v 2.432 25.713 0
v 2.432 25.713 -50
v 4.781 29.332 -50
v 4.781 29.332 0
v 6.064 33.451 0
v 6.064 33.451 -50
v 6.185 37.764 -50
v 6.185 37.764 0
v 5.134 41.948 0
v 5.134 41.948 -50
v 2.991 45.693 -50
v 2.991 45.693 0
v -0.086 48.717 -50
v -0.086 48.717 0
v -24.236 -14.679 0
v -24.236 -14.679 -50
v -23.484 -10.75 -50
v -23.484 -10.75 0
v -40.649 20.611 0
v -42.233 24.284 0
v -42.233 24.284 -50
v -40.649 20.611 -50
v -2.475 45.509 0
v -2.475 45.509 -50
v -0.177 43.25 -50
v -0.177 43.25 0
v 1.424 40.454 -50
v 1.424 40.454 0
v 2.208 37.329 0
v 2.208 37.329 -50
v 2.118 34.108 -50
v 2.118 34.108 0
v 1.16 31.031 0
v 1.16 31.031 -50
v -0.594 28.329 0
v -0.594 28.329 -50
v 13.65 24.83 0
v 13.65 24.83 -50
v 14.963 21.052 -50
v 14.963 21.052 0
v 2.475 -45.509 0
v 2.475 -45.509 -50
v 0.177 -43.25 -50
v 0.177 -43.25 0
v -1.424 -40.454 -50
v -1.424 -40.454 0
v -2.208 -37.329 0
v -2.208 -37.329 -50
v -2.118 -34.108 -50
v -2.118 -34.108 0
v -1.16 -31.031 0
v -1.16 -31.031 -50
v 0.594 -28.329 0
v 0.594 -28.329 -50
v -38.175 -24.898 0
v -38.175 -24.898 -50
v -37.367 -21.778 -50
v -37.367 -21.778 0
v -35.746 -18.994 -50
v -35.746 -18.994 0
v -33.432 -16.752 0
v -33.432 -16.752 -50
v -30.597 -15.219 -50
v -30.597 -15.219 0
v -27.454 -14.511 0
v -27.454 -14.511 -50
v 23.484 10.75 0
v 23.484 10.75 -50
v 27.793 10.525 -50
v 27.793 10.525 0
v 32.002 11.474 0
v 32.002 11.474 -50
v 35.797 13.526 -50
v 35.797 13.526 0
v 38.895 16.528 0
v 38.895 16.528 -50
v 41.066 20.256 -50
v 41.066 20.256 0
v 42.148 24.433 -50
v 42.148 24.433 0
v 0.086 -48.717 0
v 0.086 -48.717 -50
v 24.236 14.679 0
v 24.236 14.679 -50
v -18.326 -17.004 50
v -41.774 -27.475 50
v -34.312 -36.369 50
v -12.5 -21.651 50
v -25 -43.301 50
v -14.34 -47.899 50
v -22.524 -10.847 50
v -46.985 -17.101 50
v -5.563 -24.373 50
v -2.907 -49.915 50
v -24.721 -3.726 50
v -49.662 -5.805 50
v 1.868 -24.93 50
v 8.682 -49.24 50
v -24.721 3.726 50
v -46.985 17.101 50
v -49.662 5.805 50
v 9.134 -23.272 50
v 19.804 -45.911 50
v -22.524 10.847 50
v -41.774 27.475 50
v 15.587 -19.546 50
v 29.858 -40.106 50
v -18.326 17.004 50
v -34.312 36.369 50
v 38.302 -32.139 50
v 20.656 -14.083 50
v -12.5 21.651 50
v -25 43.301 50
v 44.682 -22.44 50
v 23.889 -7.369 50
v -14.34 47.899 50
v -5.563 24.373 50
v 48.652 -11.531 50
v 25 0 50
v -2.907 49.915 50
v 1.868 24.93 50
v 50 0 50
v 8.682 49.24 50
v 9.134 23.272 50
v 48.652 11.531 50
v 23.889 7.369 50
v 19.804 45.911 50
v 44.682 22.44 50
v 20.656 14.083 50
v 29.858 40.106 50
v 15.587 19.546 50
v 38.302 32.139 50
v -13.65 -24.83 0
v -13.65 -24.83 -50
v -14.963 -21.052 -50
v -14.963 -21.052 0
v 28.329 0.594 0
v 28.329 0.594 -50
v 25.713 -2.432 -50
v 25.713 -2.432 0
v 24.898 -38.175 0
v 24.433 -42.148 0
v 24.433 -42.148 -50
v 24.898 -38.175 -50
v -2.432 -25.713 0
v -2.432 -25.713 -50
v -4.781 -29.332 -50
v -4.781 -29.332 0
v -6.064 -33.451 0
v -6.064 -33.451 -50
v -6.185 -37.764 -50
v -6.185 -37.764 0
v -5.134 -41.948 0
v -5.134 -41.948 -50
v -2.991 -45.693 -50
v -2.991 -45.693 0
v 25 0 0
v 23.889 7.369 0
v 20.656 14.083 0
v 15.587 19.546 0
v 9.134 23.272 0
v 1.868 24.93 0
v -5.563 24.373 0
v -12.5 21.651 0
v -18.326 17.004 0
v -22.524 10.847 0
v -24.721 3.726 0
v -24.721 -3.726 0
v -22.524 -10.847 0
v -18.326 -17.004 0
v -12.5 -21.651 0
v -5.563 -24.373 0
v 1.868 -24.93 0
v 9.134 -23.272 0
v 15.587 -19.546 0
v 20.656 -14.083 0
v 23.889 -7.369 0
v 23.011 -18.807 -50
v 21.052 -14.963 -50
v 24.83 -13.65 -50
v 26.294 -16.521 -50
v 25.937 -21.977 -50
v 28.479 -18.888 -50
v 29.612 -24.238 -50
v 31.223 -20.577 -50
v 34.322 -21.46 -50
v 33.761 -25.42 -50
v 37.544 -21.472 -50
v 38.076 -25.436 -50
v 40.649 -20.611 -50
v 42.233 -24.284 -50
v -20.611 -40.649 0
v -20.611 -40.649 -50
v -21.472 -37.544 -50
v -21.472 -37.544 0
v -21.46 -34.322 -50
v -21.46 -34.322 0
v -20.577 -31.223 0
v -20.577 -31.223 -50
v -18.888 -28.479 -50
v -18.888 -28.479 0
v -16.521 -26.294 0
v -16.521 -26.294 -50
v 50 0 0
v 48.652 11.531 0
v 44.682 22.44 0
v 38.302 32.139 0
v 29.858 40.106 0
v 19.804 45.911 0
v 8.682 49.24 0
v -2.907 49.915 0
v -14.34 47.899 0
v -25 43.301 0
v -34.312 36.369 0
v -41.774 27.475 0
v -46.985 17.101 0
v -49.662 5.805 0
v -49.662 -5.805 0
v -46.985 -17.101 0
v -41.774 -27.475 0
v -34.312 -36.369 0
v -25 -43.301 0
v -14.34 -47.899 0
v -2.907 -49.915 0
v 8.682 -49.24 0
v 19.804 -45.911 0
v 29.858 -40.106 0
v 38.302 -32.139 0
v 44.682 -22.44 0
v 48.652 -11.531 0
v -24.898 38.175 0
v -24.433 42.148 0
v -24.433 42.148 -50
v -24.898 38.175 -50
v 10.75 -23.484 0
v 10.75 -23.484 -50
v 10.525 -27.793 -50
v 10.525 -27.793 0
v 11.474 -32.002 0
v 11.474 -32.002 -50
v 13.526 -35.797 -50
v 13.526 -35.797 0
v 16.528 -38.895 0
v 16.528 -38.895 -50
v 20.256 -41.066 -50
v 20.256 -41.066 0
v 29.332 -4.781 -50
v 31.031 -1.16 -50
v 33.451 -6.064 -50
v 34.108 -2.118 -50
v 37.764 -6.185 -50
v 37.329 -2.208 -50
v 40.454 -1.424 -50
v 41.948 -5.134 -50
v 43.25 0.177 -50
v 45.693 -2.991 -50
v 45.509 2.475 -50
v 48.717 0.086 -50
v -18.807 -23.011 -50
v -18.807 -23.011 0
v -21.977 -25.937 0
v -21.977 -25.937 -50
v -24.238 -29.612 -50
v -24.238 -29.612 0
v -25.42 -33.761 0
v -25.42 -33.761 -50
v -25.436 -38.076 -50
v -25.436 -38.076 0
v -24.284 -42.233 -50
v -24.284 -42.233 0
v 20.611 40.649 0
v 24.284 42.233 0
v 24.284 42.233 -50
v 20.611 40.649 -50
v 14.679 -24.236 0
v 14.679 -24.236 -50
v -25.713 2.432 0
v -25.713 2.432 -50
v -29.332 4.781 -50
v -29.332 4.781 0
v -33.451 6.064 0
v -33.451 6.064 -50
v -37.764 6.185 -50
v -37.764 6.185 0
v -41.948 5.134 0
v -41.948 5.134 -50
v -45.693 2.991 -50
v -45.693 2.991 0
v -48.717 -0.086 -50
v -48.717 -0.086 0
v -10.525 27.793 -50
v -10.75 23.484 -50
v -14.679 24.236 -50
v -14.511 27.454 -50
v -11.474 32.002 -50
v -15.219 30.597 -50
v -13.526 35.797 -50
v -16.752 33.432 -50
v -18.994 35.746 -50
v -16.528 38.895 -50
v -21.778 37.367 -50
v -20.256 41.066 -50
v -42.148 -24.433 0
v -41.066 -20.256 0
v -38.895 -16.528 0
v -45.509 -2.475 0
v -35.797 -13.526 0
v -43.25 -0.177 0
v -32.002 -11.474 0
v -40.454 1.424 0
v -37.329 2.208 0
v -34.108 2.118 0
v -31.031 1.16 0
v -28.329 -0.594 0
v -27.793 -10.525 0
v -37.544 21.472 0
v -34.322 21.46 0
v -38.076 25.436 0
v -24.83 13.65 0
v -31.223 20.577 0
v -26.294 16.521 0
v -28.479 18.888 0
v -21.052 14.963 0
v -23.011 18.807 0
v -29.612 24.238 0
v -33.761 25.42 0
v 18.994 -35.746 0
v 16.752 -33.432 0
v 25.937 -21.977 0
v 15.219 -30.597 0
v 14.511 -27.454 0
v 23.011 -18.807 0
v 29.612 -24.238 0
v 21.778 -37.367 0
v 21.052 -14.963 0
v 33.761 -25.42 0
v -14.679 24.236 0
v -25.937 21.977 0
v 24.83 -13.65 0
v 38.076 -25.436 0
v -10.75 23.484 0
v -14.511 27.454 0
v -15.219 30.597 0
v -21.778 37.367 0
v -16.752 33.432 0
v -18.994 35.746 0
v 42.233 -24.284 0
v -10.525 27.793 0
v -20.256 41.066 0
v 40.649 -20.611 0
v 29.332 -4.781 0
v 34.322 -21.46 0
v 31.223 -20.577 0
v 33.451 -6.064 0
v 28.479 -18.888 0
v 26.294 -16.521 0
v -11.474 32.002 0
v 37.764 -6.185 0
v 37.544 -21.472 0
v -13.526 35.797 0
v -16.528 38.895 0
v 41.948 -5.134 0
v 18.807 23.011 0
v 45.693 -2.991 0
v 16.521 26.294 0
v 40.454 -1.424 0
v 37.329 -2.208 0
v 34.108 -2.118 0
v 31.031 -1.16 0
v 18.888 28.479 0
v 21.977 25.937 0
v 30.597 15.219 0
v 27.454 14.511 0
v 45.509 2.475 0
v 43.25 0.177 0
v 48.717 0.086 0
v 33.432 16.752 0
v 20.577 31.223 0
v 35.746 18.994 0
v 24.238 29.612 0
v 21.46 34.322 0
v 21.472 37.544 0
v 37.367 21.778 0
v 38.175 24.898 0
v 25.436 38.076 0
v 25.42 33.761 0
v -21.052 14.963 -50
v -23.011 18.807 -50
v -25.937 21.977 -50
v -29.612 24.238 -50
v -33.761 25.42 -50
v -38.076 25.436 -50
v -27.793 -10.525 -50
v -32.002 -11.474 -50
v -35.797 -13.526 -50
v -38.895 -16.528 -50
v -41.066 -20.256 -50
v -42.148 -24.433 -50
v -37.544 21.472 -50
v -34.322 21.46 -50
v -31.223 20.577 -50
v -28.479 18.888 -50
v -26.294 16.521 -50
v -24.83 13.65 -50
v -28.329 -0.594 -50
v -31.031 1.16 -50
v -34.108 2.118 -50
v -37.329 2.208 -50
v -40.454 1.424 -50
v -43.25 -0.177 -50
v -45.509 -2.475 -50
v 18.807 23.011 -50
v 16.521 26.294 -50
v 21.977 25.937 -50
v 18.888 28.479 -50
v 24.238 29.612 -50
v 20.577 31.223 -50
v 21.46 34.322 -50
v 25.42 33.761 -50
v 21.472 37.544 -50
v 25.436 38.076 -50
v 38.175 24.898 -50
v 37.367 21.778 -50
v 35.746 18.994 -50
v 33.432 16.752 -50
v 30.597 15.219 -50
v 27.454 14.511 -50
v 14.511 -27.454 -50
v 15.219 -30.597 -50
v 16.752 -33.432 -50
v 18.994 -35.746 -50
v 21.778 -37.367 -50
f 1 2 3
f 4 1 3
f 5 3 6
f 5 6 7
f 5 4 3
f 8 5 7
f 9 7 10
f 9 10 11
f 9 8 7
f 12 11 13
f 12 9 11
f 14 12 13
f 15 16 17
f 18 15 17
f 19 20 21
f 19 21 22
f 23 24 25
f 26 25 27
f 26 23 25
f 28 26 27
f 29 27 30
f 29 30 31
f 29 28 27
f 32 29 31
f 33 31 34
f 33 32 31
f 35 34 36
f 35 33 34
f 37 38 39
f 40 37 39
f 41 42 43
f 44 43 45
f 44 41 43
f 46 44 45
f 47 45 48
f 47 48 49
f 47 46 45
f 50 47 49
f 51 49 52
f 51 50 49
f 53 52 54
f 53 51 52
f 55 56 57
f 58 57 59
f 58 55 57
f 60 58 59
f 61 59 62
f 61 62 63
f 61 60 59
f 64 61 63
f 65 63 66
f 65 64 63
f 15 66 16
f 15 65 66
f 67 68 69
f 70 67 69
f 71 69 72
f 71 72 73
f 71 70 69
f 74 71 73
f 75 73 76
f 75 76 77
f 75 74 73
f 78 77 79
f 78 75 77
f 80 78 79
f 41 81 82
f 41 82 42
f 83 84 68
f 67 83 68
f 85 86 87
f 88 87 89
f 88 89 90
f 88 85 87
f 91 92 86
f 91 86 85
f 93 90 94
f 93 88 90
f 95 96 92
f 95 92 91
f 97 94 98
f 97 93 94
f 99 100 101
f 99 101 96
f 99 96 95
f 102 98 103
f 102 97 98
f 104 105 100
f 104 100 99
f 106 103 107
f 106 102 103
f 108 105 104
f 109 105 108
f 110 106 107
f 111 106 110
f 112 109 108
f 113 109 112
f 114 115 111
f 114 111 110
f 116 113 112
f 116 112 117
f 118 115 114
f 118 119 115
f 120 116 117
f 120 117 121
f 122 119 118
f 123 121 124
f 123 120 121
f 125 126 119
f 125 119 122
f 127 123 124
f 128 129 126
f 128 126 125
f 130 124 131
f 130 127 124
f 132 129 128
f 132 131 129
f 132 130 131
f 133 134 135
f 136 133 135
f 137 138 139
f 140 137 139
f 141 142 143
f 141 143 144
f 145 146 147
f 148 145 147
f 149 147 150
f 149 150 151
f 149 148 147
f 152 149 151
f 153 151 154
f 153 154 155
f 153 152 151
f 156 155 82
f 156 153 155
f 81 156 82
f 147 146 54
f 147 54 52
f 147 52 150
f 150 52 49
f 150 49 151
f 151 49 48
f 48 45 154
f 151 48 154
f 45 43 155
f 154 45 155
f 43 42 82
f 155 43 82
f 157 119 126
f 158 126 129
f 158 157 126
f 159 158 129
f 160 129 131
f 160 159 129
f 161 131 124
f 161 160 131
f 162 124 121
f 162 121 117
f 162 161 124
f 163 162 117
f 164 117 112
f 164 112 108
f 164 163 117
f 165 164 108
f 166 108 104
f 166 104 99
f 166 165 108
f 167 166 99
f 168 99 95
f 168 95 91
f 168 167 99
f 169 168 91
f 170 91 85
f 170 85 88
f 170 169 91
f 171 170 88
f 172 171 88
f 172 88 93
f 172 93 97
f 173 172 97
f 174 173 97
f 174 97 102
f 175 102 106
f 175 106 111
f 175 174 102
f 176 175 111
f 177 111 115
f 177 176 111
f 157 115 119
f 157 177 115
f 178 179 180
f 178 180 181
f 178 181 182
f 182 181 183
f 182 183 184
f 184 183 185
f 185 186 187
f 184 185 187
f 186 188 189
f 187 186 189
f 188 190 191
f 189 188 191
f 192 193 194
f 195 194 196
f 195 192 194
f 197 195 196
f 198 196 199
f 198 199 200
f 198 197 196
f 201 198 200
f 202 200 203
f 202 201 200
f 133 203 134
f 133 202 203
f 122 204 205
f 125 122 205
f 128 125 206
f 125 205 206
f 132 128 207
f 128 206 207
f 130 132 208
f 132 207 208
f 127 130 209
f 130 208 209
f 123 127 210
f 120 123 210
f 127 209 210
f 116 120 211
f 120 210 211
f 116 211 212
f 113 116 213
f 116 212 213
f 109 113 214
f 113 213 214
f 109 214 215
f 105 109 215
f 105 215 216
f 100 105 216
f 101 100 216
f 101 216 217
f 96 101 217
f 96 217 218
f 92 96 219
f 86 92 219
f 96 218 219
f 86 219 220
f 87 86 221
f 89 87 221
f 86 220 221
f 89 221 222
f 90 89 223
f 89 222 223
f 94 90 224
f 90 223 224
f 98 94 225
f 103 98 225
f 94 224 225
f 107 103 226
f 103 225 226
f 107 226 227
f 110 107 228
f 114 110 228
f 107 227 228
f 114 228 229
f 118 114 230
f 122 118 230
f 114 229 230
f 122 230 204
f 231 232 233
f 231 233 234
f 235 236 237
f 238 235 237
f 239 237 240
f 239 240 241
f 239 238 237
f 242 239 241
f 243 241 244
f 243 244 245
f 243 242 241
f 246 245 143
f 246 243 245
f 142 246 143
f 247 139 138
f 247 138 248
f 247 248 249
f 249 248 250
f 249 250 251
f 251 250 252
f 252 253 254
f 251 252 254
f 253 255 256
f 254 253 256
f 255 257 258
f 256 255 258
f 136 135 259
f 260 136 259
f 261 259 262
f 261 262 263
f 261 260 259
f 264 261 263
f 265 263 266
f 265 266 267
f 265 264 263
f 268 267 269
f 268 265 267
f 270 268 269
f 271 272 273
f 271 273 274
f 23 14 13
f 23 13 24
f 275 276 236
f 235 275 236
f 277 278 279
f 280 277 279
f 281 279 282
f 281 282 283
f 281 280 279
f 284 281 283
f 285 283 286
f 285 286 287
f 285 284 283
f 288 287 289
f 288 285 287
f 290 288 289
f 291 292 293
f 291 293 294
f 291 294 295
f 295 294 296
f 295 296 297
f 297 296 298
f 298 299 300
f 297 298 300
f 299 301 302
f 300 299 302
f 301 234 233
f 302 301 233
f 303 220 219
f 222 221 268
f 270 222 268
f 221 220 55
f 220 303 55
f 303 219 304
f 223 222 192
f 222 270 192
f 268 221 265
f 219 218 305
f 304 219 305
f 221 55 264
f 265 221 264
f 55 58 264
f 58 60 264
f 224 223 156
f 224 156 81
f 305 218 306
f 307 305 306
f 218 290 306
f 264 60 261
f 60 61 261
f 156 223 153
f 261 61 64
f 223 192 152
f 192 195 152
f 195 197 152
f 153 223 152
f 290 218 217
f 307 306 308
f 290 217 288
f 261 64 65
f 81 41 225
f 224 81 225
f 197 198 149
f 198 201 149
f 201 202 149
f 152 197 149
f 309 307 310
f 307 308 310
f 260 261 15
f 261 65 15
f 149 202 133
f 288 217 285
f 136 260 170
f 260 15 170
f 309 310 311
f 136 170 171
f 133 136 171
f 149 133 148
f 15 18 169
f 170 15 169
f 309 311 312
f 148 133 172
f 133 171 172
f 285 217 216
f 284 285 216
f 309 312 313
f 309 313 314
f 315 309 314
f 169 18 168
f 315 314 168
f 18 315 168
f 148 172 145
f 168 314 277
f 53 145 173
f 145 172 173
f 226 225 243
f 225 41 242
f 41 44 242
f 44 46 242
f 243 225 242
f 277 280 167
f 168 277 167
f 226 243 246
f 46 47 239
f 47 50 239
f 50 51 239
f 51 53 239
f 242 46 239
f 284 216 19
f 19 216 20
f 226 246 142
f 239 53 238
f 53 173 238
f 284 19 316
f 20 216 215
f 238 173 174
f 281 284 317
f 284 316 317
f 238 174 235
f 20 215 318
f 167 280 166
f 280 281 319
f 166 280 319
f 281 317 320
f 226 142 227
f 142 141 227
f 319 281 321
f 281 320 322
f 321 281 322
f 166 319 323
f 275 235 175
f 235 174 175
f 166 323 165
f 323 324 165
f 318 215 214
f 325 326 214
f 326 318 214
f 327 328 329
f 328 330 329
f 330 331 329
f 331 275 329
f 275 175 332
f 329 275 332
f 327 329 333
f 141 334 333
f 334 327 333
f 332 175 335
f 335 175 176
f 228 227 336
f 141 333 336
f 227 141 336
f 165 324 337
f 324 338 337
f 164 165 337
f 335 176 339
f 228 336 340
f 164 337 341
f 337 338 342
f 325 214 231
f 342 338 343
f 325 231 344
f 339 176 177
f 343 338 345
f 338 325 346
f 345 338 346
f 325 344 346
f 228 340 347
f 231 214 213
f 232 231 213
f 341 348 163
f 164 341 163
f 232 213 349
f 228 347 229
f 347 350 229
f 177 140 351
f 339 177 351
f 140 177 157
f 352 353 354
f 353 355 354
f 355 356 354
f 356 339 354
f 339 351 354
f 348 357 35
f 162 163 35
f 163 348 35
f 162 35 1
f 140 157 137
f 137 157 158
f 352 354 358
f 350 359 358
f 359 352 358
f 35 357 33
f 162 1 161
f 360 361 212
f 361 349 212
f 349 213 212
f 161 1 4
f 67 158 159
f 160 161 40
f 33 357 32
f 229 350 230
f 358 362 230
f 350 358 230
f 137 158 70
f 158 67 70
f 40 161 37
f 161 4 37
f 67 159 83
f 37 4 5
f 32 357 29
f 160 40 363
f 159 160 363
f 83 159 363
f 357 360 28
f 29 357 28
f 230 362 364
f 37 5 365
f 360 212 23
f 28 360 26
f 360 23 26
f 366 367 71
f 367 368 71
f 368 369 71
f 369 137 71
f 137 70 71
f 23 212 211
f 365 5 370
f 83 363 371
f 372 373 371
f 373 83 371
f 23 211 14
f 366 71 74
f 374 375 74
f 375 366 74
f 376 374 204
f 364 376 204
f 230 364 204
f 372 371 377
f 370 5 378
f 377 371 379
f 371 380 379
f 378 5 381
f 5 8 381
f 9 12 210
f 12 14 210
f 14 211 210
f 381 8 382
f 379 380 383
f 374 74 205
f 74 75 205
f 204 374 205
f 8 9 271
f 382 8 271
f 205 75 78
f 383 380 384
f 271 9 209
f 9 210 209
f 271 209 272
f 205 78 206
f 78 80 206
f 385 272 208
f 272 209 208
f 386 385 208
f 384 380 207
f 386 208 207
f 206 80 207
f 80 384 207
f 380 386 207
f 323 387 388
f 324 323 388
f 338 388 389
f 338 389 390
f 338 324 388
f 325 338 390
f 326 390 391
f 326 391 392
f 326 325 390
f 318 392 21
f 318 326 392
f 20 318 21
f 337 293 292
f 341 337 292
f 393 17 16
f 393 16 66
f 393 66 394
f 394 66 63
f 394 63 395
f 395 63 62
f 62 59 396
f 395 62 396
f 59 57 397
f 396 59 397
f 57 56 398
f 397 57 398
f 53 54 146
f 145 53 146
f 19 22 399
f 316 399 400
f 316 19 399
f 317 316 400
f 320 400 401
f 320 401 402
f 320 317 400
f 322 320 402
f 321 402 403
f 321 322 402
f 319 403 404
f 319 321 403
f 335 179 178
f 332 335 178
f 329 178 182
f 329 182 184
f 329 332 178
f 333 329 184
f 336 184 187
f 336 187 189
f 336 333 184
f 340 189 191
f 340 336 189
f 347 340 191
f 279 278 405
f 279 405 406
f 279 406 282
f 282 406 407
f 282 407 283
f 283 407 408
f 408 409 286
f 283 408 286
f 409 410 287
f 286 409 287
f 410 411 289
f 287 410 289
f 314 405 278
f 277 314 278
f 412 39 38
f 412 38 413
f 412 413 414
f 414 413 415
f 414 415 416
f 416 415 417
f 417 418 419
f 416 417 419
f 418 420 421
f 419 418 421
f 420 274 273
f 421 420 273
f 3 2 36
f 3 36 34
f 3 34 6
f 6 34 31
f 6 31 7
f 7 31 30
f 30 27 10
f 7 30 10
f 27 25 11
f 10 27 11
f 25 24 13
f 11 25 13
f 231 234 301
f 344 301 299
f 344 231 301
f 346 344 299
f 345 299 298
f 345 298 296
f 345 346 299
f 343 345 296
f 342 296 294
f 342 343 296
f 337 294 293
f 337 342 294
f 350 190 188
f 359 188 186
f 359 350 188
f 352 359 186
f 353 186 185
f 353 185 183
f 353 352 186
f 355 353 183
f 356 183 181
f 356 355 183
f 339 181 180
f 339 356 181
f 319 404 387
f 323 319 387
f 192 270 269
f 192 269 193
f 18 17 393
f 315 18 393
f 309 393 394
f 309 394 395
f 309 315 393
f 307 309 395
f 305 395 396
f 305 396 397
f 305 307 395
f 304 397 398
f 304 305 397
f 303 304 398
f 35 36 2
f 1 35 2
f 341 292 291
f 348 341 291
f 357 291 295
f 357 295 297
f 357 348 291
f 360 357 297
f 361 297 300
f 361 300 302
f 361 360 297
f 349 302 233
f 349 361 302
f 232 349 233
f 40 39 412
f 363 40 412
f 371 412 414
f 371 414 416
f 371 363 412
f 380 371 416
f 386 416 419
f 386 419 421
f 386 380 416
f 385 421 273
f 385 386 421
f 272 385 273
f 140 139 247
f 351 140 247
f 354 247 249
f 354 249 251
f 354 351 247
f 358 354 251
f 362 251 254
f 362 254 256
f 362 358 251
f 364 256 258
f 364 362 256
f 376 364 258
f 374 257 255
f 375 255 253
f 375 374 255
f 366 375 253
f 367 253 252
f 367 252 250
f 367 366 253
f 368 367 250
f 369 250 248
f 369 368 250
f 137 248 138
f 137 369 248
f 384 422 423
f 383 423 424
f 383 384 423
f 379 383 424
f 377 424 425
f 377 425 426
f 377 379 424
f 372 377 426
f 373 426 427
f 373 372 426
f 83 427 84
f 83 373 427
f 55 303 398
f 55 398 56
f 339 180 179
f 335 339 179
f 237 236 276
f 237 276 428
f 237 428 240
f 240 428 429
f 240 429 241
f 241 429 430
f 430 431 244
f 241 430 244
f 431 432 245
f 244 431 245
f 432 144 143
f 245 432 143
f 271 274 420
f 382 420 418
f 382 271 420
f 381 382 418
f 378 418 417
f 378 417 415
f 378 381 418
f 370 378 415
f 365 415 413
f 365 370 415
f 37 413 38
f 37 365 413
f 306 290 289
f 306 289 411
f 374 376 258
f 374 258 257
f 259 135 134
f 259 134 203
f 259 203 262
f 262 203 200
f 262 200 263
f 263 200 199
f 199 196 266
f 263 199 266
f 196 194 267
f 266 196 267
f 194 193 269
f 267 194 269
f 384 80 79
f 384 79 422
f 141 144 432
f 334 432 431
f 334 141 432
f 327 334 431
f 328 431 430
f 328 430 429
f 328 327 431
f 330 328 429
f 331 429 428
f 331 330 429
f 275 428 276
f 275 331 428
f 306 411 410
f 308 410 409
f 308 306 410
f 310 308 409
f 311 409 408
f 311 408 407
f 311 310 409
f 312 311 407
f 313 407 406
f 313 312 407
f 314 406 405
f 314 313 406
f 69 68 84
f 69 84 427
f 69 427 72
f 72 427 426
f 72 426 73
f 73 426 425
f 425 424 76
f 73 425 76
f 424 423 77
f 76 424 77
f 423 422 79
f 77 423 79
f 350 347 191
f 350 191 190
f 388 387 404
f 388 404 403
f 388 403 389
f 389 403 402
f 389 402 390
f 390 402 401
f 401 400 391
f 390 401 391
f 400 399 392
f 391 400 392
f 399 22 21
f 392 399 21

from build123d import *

# Parameters (mm, degrees)
F0_R            = 50
F1_DEPTH        = 50
F2_R            = 25
F3_DEPTH        = 50
F5_DEPTH        = 50
F5_COPIES_COUNT = 12


# Not quite as in the source:
# - a pattern or mirror of a feature is missing from the dataset's text; its kind, count and spacing are read off the source's solid


with BuildPart() as f1:
    # F0 (on Top) → F1 (new body)
    with BuildSketch(Plane.XY):
        Circle(F0_R)
    extrude(amount=F1_DEPTH)

    # F2 (on Top) → F3 (cut)
    with BuildSketch(Plane.XY):
        Circle(F2_R)
    extrude(amount=F3_DEPTH, mode=Mode.SUBTRACT)

    # F4 (on Top) → F5 (join)
    with BuildSketch(Plane.XY):
        with BuildLine():
            Line((24.2363690546, 14.6788293603), (23.4842319041, 10.750179179))
            ThreePointArc((23.4842319041, 10.750179179), (35.7966783621, 13.5258846201), (42.1475842595, 24.4330782443))
            Line((42.1475842595, 24.4330782443), (38.1746449562, 24.8975734892))
            ThreePointArc((38.1746449562, 24.8975734892), (33.4316236094, 16.7517982205), (24.2363690546, 14.6788293603))
        make_face()
    f5 = extrude(amount=-F5_DEPTH)

    # F5_copies: F5 ×12 about axis
    f5_copies_axis = Axis((0, 0, 0), (0, 0, 1))
    for i in range(1, F5_COPIES_COUNT):
        add(f5.rotate(f5_copies_axis, i * 360 / F5_COPIES_COUNT))


solid = f1.part
